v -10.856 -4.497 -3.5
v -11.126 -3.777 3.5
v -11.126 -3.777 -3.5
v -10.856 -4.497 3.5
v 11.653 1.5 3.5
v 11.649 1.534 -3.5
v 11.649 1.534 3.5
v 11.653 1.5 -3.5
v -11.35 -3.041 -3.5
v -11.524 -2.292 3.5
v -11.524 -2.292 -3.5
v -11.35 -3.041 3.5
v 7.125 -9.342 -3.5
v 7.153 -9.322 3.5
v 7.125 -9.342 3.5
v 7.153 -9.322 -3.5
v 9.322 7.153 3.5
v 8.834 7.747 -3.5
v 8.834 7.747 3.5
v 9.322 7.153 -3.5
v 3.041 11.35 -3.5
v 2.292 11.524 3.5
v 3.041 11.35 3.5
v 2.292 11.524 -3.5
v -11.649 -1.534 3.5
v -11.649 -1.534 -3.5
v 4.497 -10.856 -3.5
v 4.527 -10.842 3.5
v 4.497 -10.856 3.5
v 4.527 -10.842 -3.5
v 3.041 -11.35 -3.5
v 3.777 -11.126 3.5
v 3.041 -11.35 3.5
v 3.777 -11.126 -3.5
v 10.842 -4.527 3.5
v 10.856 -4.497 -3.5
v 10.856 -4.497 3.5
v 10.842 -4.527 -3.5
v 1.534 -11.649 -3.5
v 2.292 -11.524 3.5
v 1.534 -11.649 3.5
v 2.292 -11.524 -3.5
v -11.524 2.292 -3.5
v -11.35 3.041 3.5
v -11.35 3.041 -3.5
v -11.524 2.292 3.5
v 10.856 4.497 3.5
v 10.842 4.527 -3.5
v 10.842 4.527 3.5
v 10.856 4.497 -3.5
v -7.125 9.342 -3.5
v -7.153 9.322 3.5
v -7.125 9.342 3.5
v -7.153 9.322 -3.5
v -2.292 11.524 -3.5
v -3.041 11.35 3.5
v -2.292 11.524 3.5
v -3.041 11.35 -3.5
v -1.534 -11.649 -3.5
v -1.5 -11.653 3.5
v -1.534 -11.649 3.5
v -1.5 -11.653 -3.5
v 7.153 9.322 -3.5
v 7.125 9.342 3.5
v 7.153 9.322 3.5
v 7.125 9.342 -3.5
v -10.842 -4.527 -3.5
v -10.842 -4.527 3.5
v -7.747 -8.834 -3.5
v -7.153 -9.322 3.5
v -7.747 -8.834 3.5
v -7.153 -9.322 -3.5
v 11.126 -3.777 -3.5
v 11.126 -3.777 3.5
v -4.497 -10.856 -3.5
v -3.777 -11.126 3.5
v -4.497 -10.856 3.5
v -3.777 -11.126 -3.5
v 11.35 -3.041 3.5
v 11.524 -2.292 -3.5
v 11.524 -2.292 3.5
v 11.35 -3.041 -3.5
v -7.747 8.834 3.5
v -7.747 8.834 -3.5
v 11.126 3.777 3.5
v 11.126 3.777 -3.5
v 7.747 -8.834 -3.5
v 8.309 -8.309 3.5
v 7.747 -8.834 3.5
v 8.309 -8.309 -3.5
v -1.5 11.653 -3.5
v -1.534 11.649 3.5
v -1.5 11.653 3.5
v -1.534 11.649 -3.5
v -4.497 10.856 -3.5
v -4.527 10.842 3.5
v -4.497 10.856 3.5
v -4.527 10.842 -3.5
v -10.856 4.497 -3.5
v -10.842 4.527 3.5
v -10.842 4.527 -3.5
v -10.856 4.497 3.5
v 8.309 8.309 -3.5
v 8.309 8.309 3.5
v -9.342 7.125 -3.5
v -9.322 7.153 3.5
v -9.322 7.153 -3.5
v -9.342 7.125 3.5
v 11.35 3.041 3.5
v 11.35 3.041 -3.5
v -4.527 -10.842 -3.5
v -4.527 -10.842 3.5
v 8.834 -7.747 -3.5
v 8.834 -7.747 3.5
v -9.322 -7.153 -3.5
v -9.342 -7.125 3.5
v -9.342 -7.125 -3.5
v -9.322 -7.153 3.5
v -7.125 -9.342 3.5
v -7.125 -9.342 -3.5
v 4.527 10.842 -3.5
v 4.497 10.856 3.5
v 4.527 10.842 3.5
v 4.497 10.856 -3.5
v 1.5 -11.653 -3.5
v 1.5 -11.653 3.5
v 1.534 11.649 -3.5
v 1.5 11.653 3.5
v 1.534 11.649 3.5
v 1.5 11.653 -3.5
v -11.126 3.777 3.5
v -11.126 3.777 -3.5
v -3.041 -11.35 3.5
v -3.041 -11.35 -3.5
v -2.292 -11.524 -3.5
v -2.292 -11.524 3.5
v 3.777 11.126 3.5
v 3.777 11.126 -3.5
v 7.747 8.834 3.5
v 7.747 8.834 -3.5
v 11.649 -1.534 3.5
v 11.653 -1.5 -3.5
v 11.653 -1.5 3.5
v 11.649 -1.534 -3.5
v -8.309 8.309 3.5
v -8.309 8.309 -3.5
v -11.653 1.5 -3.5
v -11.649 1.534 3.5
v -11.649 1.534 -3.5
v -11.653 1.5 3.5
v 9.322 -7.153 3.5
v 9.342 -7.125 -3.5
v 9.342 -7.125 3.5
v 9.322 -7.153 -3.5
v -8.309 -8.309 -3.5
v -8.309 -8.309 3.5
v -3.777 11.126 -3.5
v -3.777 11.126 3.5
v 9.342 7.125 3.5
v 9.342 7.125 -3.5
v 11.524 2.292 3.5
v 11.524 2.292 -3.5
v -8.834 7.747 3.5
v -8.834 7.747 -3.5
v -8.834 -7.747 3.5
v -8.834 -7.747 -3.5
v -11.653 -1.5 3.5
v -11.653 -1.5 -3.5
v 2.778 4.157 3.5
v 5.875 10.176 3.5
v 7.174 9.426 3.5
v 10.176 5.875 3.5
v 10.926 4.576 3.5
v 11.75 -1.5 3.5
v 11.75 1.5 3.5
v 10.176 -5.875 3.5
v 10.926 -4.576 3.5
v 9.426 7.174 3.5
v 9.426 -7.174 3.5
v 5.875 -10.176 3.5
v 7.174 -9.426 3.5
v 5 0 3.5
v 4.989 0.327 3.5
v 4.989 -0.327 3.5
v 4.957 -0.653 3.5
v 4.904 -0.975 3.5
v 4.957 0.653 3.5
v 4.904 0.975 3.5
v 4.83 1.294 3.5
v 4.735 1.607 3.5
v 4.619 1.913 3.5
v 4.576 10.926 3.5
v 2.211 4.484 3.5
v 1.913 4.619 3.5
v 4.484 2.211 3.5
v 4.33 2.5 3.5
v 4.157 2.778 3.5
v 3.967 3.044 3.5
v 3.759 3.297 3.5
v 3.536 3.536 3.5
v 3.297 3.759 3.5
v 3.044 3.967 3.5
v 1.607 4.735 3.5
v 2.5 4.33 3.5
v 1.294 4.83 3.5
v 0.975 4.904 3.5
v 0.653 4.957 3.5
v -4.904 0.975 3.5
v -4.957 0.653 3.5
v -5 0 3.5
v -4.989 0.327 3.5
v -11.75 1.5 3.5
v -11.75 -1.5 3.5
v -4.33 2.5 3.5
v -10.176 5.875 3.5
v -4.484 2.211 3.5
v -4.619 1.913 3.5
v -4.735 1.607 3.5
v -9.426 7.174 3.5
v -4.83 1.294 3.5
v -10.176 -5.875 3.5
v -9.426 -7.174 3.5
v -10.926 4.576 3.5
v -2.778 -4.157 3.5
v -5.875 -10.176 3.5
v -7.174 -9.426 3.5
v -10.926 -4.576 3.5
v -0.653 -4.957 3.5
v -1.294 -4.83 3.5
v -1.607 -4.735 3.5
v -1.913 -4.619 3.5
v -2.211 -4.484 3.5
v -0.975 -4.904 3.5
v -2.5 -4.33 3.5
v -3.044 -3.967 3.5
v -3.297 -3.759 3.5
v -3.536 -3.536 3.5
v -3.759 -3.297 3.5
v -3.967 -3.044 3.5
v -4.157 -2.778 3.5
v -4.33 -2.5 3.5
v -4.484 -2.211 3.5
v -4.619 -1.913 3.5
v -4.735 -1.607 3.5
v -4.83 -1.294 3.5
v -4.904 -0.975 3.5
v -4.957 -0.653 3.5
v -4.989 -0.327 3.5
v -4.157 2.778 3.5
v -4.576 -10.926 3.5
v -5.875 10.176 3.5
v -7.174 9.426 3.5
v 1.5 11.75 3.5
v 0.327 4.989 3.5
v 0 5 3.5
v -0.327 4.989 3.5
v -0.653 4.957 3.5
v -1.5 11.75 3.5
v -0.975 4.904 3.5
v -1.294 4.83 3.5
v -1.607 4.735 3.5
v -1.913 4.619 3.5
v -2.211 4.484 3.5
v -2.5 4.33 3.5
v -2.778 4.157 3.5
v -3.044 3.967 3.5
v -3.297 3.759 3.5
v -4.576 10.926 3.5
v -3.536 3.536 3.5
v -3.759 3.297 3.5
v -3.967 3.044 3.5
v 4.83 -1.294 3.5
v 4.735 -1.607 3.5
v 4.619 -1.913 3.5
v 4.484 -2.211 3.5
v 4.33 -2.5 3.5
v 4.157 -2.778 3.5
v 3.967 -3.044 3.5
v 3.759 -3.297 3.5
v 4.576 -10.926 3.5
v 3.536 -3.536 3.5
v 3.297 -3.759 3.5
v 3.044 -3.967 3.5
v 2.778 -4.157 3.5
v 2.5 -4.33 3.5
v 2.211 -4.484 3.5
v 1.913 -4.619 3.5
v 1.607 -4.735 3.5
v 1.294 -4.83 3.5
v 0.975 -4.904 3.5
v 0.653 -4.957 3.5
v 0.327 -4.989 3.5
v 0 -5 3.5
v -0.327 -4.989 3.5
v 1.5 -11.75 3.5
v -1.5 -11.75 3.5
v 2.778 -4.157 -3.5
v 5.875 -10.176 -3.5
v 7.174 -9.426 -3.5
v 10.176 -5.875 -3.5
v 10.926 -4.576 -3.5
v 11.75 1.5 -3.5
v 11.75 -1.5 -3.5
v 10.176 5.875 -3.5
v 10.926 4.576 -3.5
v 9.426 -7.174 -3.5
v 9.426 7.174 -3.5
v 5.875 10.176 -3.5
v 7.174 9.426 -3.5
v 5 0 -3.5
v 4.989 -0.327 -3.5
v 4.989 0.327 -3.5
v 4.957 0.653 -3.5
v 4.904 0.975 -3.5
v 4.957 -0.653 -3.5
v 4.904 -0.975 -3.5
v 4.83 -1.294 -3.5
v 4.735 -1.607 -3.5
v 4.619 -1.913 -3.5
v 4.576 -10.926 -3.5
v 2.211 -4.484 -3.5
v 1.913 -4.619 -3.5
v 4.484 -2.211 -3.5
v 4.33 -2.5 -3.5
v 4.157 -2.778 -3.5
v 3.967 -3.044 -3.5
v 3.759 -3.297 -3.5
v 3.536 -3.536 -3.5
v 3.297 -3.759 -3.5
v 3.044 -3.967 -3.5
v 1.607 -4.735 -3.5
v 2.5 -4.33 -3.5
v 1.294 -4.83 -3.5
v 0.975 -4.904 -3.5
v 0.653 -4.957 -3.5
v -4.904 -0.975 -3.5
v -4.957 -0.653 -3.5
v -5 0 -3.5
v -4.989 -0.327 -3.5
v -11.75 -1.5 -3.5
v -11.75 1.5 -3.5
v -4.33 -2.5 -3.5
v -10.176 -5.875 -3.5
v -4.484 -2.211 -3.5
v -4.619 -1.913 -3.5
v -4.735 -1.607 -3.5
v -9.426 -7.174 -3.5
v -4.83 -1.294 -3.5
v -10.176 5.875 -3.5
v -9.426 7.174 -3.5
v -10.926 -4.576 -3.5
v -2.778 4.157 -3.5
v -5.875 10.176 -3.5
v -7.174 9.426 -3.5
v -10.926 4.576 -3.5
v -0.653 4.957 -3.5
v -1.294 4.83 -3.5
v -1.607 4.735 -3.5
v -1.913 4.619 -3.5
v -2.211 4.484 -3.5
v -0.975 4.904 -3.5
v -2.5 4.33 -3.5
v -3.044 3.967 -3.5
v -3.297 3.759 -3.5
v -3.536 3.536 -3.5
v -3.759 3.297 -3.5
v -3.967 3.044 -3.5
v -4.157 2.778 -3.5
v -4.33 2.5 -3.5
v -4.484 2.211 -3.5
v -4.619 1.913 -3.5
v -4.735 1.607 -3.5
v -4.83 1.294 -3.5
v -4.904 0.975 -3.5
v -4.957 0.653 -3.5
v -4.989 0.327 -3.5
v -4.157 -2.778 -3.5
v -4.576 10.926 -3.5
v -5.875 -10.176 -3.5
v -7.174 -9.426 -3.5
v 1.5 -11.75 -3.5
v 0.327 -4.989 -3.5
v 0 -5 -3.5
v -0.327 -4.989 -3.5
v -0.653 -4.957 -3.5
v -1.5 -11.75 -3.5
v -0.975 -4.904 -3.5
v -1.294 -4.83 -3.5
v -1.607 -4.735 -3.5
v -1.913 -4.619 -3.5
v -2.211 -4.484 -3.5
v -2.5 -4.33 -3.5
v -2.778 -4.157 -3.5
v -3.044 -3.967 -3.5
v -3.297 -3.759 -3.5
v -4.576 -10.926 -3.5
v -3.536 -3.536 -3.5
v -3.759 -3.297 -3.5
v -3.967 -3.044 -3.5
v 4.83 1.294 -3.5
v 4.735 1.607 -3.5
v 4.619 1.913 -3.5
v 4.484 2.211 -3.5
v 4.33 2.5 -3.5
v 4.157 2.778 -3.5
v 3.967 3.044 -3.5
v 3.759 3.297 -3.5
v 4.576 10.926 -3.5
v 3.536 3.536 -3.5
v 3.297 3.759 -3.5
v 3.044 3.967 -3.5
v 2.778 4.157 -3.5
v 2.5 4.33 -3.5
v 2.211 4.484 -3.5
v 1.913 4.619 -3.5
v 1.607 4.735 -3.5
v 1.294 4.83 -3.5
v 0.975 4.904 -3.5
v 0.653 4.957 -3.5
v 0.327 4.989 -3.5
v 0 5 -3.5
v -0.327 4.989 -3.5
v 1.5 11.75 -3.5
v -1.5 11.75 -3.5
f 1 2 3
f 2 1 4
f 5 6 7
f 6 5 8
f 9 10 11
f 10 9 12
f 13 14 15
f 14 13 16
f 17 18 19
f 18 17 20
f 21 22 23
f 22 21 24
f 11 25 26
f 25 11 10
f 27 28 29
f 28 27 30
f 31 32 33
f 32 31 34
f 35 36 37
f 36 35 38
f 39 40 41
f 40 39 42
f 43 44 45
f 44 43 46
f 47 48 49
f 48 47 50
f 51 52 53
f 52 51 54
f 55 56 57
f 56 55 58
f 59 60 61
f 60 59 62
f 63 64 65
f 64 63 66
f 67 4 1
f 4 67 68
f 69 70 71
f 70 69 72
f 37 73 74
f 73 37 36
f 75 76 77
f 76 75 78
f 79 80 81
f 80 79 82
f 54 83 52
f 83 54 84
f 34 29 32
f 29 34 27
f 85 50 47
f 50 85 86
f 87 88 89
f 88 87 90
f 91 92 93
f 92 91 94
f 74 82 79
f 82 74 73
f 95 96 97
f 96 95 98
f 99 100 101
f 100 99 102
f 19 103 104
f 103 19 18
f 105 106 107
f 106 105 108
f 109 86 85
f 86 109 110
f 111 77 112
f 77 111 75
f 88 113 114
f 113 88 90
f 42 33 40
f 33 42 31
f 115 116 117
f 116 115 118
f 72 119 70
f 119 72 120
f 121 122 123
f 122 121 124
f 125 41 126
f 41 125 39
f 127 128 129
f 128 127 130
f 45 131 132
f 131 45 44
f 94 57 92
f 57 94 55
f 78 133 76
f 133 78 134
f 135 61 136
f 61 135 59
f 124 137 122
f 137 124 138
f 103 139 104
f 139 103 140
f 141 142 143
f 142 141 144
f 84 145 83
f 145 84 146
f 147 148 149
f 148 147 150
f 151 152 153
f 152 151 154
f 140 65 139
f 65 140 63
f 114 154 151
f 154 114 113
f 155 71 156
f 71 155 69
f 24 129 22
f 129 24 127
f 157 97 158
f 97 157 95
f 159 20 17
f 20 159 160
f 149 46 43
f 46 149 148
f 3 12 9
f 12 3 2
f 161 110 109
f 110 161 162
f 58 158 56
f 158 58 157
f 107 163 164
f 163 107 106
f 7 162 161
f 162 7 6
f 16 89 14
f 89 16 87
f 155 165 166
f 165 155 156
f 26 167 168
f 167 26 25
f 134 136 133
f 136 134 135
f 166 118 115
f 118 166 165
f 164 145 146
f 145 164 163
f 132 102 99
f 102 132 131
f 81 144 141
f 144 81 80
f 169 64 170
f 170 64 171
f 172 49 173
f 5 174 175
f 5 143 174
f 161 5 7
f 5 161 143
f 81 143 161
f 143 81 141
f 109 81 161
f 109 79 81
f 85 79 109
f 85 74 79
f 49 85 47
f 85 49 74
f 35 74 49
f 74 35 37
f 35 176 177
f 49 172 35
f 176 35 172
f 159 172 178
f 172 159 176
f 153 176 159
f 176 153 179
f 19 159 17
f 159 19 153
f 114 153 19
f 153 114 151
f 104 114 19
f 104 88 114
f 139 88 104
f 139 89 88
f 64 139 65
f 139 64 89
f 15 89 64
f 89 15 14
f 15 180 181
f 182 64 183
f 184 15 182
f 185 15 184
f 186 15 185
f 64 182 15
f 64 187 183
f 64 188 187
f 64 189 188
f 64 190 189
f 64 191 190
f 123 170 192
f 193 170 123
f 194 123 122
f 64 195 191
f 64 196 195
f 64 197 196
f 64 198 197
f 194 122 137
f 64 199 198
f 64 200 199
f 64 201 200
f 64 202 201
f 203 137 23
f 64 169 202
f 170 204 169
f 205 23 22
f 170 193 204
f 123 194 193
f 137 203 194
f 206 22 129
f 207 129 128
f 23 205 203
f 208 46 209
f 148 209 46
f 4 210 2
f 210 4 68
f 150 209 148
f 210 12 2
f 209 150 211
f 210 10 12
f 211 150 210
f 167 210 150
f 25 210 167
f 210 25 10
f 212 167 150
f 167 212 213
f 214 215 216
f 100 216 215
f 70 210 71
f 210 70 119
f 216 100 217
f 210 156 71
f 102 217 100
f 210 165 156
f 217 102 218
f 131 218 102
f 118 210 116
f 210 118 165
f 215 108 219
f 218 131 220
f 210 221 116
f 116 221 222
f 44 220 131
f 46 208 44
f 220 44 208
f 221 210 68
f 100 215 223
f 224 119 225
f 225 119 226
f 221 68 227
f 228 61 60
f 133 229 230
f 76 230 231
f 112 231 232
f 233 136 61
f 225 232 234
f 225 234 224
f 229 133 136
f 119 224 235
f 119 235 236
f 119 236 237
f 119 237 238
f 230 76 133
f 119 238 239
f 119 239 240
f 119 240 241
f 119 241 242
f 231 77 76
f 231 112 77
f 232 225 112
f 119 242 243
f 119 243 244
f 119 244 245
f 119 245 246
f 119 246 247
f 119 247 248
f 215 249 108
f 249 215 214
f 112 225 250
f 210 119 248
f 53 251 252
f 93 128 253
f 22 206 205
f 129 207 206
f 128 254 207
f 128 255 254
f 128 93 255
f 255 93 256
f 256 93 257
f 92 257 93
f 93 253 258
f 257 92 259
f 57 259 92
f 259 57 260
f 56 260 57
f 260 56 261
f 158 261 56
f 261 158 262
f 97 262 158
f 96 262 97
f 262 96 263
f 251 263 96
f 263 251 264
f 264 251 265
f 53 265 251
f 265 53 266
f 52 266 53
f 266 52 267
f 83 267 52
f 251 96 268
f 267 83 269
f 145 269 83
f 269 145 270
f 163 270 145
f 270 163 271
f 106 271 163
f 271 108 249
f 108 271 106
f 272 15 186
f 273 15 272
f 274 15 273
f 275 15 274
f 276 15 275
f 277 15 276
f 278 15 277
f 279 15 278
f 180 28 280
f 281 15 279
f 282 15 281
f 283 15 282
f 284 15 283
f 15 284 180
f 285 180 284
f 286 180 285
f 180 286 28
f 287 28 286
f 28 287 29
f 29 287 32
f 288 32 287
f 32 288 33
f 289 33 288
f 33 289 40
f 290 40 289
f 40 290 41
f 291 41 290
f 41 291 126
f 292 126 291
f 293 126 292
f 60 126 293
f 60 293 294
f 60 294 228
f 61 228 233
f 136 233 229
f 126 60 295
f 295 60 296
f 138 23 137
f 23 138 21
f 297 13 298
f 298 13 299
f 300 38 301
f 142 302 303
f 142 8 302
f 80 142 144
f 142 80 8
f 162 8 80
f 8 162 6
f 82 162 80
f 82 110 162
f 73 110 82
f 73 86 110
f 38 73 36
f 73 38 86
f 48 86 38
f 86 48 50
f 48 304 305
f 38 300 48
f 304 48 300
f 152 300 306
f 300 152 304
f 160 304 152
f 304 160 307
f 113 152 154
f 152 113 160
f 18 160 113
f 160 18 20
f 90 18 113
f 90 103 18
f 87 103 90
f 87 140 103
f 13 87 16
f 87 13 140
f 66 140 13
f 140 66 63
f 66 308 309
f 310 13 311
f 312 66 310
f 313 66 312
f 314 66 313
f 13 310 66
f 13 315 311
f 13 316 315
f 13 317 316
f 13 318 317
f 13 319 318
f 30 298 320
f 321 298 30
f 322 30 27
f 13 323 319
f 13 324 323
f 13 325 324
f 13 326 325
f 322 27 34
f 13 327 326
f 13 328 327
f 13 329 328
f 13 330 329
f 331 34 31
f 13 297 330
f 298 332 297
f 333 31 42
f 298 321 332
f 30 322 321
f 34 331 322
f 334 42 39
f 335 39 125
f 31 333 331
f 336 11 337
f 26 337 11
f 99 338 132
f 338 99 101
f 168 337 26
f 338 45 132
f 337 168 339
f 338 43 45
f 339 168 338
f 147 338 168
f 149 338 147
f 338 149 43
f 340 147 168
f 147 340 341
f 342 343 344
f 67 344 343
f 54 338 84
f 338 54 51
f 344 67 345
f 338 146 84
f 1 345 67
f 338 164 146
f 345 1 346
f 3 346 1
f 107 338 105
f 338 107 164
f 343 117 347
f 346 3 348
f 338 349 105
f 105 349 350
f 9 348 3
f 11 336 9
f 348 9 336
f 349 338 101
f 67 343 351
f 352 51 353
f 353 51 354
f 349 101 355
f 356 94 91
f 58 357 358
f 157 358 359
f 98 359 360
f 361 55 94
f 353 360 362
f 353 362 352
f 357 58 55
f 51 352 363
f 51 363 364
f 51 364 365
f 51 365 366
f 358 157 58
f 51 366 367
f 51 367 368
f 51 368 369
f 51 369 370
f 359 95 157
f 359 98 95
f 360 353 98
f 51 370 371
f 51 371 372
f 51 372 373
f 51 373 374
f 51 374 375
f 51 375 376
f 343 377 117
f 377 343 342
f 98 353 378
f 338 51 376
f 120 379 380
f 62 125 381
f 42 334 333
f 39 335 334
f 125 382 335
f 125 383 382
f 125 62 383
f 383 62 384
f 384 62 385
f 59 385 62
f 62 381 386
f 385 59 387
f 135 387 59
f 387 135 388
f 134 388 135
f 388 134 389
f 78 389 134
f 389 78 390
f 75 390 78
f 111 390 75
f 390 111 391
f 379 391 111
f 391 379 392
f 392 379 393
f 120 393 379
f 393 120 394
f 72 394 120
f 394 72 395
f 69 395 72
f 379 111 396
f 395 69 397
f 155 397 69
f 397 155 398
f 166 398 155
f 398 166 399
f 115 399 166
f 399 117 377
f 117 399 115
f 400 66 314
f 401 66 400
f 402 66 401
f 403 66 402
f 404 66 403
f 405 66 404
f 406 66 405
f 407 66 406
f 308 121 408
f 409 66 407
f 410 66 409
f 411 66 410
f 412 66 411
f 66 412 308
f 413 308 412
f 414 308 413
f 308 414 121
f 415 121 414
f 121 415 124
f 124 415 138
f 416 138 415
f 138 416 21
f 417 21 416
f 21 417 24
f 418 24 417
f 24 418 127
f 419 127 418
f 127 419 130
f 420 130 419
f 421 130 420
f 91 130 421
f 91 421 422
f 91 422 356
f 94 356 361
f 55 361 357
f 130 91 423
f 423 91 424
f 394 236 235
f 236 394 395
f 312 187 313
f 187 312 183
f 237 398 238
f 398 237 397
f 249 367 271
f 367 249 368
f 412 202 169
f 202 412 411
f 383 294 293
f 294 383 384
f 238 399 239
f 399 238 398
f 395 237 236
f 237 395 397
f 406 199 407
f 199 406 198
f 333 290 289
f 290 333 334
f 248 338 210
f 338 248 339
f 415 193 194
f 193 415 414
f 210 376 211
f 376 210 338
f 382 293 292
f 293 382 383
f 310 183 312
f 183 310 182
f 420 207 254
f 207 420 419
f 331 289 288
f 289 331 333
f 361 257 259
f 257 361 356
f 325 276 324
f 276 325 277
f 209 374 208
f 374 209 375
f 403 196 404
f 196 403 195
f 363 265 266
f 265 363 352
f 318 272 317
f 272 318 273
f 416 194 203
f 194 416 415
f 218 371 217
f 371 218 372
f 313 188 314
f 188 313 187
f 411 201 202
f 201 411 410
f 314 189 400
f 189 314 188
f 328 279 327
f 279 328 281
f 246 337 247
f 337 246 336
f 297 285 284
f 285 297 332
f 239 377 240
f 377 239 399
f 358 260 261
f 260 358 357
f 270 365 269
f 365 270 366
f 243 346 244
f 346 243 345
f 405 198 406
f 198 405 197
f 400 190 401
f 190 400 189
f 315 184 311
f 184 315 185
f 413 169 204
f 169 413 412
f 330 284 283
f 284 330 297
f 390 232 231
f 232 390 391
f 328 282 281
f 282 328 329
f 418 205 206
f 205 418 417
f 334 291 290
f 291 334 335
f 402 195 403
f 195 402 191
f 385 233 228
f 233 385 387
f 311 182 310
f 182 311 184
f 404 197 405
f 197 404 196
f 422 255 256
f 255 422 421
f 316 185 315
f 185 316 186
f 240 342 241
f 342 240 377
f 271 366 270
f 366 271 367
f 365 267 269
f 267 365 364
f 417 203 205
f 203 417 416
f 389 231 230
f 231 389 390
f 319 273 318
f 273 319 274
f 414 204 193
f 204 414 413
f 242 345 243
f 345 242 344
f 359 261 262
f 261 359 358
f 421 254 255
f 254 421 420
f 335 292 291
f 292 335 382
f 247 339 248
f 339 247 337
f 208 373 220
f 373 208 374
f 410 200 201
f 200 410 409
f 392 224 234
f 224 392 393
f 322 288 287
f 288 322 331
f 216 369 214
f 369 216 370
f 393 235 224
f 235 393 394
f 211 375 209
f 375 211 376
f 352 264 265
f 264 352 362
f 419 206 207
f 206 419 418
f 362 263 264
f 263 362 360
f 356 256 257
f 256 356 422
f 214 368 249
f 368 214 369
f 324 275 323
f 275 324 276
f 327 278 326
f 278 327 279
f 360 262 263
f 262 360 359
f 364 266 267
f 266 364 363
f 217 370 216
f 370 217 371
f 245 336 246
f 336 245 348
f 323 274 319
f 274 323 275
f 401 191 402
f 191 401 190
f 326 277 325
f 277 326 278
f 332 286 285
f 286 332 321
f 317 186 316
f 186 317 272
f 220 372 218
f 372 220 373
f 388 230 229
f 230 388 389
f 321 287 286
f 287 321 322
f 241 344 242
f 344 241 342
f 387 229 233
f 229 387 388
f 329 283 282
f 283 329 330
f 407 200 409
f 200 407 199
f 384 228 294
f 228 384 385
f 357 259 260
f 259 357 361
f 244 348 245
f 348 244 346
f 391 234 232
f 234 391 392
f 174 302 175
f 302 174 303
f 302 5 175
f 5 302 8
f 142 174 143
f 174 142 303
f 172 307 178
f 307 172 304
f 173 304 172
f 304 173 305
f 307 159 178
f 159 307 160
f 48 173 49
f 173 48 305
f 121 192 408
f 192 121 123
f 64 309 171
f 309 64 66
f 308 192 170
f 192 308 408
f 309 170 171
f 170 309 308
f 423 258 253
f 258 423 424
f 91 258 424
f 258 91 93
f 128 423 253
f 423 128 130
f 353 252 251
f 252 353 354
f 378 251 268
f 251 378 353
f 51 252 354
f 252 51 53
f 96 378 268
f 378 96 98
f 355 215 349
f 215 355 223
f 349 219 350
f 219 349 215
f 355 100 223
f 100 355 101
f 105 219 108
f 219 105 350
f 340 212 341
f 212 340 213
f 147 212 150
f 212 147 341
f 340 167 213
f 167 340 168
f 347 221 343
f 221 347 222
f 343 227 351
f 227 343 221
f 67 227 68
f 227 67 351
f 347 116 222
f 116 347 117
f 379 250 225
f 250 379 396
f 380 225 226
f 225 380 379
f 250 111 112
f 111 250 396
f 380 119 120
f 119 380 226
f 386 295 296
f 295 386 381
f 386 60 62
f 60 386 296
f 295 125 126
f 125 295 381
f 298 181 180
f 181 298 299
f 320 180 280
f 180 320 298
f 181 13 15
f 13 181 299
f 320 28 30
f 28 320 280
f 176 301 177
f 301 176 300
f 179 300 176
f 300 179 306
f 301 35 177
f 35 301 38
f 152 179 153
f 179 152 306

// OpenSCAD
$fn=96;

outer_d = 23.5;
thickness = 7.0;

bore_d = 10.0;

lug_count = 12;
lug_radial = 1.6;
lug_tangential = 3.0;

module ring_body() {
    difference() {
        cylinder(h=thickness, d=outer_d, center=true);
        cylinder(h=thickness+0.4, d=bore_d, center=true);
    }
}

module lug() {
    translate([outer_d/2 - lug_radial/2, 0, 0])
        cube([lug_radial, lug_tangential, thickness], center=true);
}

module lugs() {
    for (i = [0:lug_count-1]) {
        rotate([0,0, i*360/lug_count]) lug();
    }
}

union() {
    ring_body();
    lugs();
}
